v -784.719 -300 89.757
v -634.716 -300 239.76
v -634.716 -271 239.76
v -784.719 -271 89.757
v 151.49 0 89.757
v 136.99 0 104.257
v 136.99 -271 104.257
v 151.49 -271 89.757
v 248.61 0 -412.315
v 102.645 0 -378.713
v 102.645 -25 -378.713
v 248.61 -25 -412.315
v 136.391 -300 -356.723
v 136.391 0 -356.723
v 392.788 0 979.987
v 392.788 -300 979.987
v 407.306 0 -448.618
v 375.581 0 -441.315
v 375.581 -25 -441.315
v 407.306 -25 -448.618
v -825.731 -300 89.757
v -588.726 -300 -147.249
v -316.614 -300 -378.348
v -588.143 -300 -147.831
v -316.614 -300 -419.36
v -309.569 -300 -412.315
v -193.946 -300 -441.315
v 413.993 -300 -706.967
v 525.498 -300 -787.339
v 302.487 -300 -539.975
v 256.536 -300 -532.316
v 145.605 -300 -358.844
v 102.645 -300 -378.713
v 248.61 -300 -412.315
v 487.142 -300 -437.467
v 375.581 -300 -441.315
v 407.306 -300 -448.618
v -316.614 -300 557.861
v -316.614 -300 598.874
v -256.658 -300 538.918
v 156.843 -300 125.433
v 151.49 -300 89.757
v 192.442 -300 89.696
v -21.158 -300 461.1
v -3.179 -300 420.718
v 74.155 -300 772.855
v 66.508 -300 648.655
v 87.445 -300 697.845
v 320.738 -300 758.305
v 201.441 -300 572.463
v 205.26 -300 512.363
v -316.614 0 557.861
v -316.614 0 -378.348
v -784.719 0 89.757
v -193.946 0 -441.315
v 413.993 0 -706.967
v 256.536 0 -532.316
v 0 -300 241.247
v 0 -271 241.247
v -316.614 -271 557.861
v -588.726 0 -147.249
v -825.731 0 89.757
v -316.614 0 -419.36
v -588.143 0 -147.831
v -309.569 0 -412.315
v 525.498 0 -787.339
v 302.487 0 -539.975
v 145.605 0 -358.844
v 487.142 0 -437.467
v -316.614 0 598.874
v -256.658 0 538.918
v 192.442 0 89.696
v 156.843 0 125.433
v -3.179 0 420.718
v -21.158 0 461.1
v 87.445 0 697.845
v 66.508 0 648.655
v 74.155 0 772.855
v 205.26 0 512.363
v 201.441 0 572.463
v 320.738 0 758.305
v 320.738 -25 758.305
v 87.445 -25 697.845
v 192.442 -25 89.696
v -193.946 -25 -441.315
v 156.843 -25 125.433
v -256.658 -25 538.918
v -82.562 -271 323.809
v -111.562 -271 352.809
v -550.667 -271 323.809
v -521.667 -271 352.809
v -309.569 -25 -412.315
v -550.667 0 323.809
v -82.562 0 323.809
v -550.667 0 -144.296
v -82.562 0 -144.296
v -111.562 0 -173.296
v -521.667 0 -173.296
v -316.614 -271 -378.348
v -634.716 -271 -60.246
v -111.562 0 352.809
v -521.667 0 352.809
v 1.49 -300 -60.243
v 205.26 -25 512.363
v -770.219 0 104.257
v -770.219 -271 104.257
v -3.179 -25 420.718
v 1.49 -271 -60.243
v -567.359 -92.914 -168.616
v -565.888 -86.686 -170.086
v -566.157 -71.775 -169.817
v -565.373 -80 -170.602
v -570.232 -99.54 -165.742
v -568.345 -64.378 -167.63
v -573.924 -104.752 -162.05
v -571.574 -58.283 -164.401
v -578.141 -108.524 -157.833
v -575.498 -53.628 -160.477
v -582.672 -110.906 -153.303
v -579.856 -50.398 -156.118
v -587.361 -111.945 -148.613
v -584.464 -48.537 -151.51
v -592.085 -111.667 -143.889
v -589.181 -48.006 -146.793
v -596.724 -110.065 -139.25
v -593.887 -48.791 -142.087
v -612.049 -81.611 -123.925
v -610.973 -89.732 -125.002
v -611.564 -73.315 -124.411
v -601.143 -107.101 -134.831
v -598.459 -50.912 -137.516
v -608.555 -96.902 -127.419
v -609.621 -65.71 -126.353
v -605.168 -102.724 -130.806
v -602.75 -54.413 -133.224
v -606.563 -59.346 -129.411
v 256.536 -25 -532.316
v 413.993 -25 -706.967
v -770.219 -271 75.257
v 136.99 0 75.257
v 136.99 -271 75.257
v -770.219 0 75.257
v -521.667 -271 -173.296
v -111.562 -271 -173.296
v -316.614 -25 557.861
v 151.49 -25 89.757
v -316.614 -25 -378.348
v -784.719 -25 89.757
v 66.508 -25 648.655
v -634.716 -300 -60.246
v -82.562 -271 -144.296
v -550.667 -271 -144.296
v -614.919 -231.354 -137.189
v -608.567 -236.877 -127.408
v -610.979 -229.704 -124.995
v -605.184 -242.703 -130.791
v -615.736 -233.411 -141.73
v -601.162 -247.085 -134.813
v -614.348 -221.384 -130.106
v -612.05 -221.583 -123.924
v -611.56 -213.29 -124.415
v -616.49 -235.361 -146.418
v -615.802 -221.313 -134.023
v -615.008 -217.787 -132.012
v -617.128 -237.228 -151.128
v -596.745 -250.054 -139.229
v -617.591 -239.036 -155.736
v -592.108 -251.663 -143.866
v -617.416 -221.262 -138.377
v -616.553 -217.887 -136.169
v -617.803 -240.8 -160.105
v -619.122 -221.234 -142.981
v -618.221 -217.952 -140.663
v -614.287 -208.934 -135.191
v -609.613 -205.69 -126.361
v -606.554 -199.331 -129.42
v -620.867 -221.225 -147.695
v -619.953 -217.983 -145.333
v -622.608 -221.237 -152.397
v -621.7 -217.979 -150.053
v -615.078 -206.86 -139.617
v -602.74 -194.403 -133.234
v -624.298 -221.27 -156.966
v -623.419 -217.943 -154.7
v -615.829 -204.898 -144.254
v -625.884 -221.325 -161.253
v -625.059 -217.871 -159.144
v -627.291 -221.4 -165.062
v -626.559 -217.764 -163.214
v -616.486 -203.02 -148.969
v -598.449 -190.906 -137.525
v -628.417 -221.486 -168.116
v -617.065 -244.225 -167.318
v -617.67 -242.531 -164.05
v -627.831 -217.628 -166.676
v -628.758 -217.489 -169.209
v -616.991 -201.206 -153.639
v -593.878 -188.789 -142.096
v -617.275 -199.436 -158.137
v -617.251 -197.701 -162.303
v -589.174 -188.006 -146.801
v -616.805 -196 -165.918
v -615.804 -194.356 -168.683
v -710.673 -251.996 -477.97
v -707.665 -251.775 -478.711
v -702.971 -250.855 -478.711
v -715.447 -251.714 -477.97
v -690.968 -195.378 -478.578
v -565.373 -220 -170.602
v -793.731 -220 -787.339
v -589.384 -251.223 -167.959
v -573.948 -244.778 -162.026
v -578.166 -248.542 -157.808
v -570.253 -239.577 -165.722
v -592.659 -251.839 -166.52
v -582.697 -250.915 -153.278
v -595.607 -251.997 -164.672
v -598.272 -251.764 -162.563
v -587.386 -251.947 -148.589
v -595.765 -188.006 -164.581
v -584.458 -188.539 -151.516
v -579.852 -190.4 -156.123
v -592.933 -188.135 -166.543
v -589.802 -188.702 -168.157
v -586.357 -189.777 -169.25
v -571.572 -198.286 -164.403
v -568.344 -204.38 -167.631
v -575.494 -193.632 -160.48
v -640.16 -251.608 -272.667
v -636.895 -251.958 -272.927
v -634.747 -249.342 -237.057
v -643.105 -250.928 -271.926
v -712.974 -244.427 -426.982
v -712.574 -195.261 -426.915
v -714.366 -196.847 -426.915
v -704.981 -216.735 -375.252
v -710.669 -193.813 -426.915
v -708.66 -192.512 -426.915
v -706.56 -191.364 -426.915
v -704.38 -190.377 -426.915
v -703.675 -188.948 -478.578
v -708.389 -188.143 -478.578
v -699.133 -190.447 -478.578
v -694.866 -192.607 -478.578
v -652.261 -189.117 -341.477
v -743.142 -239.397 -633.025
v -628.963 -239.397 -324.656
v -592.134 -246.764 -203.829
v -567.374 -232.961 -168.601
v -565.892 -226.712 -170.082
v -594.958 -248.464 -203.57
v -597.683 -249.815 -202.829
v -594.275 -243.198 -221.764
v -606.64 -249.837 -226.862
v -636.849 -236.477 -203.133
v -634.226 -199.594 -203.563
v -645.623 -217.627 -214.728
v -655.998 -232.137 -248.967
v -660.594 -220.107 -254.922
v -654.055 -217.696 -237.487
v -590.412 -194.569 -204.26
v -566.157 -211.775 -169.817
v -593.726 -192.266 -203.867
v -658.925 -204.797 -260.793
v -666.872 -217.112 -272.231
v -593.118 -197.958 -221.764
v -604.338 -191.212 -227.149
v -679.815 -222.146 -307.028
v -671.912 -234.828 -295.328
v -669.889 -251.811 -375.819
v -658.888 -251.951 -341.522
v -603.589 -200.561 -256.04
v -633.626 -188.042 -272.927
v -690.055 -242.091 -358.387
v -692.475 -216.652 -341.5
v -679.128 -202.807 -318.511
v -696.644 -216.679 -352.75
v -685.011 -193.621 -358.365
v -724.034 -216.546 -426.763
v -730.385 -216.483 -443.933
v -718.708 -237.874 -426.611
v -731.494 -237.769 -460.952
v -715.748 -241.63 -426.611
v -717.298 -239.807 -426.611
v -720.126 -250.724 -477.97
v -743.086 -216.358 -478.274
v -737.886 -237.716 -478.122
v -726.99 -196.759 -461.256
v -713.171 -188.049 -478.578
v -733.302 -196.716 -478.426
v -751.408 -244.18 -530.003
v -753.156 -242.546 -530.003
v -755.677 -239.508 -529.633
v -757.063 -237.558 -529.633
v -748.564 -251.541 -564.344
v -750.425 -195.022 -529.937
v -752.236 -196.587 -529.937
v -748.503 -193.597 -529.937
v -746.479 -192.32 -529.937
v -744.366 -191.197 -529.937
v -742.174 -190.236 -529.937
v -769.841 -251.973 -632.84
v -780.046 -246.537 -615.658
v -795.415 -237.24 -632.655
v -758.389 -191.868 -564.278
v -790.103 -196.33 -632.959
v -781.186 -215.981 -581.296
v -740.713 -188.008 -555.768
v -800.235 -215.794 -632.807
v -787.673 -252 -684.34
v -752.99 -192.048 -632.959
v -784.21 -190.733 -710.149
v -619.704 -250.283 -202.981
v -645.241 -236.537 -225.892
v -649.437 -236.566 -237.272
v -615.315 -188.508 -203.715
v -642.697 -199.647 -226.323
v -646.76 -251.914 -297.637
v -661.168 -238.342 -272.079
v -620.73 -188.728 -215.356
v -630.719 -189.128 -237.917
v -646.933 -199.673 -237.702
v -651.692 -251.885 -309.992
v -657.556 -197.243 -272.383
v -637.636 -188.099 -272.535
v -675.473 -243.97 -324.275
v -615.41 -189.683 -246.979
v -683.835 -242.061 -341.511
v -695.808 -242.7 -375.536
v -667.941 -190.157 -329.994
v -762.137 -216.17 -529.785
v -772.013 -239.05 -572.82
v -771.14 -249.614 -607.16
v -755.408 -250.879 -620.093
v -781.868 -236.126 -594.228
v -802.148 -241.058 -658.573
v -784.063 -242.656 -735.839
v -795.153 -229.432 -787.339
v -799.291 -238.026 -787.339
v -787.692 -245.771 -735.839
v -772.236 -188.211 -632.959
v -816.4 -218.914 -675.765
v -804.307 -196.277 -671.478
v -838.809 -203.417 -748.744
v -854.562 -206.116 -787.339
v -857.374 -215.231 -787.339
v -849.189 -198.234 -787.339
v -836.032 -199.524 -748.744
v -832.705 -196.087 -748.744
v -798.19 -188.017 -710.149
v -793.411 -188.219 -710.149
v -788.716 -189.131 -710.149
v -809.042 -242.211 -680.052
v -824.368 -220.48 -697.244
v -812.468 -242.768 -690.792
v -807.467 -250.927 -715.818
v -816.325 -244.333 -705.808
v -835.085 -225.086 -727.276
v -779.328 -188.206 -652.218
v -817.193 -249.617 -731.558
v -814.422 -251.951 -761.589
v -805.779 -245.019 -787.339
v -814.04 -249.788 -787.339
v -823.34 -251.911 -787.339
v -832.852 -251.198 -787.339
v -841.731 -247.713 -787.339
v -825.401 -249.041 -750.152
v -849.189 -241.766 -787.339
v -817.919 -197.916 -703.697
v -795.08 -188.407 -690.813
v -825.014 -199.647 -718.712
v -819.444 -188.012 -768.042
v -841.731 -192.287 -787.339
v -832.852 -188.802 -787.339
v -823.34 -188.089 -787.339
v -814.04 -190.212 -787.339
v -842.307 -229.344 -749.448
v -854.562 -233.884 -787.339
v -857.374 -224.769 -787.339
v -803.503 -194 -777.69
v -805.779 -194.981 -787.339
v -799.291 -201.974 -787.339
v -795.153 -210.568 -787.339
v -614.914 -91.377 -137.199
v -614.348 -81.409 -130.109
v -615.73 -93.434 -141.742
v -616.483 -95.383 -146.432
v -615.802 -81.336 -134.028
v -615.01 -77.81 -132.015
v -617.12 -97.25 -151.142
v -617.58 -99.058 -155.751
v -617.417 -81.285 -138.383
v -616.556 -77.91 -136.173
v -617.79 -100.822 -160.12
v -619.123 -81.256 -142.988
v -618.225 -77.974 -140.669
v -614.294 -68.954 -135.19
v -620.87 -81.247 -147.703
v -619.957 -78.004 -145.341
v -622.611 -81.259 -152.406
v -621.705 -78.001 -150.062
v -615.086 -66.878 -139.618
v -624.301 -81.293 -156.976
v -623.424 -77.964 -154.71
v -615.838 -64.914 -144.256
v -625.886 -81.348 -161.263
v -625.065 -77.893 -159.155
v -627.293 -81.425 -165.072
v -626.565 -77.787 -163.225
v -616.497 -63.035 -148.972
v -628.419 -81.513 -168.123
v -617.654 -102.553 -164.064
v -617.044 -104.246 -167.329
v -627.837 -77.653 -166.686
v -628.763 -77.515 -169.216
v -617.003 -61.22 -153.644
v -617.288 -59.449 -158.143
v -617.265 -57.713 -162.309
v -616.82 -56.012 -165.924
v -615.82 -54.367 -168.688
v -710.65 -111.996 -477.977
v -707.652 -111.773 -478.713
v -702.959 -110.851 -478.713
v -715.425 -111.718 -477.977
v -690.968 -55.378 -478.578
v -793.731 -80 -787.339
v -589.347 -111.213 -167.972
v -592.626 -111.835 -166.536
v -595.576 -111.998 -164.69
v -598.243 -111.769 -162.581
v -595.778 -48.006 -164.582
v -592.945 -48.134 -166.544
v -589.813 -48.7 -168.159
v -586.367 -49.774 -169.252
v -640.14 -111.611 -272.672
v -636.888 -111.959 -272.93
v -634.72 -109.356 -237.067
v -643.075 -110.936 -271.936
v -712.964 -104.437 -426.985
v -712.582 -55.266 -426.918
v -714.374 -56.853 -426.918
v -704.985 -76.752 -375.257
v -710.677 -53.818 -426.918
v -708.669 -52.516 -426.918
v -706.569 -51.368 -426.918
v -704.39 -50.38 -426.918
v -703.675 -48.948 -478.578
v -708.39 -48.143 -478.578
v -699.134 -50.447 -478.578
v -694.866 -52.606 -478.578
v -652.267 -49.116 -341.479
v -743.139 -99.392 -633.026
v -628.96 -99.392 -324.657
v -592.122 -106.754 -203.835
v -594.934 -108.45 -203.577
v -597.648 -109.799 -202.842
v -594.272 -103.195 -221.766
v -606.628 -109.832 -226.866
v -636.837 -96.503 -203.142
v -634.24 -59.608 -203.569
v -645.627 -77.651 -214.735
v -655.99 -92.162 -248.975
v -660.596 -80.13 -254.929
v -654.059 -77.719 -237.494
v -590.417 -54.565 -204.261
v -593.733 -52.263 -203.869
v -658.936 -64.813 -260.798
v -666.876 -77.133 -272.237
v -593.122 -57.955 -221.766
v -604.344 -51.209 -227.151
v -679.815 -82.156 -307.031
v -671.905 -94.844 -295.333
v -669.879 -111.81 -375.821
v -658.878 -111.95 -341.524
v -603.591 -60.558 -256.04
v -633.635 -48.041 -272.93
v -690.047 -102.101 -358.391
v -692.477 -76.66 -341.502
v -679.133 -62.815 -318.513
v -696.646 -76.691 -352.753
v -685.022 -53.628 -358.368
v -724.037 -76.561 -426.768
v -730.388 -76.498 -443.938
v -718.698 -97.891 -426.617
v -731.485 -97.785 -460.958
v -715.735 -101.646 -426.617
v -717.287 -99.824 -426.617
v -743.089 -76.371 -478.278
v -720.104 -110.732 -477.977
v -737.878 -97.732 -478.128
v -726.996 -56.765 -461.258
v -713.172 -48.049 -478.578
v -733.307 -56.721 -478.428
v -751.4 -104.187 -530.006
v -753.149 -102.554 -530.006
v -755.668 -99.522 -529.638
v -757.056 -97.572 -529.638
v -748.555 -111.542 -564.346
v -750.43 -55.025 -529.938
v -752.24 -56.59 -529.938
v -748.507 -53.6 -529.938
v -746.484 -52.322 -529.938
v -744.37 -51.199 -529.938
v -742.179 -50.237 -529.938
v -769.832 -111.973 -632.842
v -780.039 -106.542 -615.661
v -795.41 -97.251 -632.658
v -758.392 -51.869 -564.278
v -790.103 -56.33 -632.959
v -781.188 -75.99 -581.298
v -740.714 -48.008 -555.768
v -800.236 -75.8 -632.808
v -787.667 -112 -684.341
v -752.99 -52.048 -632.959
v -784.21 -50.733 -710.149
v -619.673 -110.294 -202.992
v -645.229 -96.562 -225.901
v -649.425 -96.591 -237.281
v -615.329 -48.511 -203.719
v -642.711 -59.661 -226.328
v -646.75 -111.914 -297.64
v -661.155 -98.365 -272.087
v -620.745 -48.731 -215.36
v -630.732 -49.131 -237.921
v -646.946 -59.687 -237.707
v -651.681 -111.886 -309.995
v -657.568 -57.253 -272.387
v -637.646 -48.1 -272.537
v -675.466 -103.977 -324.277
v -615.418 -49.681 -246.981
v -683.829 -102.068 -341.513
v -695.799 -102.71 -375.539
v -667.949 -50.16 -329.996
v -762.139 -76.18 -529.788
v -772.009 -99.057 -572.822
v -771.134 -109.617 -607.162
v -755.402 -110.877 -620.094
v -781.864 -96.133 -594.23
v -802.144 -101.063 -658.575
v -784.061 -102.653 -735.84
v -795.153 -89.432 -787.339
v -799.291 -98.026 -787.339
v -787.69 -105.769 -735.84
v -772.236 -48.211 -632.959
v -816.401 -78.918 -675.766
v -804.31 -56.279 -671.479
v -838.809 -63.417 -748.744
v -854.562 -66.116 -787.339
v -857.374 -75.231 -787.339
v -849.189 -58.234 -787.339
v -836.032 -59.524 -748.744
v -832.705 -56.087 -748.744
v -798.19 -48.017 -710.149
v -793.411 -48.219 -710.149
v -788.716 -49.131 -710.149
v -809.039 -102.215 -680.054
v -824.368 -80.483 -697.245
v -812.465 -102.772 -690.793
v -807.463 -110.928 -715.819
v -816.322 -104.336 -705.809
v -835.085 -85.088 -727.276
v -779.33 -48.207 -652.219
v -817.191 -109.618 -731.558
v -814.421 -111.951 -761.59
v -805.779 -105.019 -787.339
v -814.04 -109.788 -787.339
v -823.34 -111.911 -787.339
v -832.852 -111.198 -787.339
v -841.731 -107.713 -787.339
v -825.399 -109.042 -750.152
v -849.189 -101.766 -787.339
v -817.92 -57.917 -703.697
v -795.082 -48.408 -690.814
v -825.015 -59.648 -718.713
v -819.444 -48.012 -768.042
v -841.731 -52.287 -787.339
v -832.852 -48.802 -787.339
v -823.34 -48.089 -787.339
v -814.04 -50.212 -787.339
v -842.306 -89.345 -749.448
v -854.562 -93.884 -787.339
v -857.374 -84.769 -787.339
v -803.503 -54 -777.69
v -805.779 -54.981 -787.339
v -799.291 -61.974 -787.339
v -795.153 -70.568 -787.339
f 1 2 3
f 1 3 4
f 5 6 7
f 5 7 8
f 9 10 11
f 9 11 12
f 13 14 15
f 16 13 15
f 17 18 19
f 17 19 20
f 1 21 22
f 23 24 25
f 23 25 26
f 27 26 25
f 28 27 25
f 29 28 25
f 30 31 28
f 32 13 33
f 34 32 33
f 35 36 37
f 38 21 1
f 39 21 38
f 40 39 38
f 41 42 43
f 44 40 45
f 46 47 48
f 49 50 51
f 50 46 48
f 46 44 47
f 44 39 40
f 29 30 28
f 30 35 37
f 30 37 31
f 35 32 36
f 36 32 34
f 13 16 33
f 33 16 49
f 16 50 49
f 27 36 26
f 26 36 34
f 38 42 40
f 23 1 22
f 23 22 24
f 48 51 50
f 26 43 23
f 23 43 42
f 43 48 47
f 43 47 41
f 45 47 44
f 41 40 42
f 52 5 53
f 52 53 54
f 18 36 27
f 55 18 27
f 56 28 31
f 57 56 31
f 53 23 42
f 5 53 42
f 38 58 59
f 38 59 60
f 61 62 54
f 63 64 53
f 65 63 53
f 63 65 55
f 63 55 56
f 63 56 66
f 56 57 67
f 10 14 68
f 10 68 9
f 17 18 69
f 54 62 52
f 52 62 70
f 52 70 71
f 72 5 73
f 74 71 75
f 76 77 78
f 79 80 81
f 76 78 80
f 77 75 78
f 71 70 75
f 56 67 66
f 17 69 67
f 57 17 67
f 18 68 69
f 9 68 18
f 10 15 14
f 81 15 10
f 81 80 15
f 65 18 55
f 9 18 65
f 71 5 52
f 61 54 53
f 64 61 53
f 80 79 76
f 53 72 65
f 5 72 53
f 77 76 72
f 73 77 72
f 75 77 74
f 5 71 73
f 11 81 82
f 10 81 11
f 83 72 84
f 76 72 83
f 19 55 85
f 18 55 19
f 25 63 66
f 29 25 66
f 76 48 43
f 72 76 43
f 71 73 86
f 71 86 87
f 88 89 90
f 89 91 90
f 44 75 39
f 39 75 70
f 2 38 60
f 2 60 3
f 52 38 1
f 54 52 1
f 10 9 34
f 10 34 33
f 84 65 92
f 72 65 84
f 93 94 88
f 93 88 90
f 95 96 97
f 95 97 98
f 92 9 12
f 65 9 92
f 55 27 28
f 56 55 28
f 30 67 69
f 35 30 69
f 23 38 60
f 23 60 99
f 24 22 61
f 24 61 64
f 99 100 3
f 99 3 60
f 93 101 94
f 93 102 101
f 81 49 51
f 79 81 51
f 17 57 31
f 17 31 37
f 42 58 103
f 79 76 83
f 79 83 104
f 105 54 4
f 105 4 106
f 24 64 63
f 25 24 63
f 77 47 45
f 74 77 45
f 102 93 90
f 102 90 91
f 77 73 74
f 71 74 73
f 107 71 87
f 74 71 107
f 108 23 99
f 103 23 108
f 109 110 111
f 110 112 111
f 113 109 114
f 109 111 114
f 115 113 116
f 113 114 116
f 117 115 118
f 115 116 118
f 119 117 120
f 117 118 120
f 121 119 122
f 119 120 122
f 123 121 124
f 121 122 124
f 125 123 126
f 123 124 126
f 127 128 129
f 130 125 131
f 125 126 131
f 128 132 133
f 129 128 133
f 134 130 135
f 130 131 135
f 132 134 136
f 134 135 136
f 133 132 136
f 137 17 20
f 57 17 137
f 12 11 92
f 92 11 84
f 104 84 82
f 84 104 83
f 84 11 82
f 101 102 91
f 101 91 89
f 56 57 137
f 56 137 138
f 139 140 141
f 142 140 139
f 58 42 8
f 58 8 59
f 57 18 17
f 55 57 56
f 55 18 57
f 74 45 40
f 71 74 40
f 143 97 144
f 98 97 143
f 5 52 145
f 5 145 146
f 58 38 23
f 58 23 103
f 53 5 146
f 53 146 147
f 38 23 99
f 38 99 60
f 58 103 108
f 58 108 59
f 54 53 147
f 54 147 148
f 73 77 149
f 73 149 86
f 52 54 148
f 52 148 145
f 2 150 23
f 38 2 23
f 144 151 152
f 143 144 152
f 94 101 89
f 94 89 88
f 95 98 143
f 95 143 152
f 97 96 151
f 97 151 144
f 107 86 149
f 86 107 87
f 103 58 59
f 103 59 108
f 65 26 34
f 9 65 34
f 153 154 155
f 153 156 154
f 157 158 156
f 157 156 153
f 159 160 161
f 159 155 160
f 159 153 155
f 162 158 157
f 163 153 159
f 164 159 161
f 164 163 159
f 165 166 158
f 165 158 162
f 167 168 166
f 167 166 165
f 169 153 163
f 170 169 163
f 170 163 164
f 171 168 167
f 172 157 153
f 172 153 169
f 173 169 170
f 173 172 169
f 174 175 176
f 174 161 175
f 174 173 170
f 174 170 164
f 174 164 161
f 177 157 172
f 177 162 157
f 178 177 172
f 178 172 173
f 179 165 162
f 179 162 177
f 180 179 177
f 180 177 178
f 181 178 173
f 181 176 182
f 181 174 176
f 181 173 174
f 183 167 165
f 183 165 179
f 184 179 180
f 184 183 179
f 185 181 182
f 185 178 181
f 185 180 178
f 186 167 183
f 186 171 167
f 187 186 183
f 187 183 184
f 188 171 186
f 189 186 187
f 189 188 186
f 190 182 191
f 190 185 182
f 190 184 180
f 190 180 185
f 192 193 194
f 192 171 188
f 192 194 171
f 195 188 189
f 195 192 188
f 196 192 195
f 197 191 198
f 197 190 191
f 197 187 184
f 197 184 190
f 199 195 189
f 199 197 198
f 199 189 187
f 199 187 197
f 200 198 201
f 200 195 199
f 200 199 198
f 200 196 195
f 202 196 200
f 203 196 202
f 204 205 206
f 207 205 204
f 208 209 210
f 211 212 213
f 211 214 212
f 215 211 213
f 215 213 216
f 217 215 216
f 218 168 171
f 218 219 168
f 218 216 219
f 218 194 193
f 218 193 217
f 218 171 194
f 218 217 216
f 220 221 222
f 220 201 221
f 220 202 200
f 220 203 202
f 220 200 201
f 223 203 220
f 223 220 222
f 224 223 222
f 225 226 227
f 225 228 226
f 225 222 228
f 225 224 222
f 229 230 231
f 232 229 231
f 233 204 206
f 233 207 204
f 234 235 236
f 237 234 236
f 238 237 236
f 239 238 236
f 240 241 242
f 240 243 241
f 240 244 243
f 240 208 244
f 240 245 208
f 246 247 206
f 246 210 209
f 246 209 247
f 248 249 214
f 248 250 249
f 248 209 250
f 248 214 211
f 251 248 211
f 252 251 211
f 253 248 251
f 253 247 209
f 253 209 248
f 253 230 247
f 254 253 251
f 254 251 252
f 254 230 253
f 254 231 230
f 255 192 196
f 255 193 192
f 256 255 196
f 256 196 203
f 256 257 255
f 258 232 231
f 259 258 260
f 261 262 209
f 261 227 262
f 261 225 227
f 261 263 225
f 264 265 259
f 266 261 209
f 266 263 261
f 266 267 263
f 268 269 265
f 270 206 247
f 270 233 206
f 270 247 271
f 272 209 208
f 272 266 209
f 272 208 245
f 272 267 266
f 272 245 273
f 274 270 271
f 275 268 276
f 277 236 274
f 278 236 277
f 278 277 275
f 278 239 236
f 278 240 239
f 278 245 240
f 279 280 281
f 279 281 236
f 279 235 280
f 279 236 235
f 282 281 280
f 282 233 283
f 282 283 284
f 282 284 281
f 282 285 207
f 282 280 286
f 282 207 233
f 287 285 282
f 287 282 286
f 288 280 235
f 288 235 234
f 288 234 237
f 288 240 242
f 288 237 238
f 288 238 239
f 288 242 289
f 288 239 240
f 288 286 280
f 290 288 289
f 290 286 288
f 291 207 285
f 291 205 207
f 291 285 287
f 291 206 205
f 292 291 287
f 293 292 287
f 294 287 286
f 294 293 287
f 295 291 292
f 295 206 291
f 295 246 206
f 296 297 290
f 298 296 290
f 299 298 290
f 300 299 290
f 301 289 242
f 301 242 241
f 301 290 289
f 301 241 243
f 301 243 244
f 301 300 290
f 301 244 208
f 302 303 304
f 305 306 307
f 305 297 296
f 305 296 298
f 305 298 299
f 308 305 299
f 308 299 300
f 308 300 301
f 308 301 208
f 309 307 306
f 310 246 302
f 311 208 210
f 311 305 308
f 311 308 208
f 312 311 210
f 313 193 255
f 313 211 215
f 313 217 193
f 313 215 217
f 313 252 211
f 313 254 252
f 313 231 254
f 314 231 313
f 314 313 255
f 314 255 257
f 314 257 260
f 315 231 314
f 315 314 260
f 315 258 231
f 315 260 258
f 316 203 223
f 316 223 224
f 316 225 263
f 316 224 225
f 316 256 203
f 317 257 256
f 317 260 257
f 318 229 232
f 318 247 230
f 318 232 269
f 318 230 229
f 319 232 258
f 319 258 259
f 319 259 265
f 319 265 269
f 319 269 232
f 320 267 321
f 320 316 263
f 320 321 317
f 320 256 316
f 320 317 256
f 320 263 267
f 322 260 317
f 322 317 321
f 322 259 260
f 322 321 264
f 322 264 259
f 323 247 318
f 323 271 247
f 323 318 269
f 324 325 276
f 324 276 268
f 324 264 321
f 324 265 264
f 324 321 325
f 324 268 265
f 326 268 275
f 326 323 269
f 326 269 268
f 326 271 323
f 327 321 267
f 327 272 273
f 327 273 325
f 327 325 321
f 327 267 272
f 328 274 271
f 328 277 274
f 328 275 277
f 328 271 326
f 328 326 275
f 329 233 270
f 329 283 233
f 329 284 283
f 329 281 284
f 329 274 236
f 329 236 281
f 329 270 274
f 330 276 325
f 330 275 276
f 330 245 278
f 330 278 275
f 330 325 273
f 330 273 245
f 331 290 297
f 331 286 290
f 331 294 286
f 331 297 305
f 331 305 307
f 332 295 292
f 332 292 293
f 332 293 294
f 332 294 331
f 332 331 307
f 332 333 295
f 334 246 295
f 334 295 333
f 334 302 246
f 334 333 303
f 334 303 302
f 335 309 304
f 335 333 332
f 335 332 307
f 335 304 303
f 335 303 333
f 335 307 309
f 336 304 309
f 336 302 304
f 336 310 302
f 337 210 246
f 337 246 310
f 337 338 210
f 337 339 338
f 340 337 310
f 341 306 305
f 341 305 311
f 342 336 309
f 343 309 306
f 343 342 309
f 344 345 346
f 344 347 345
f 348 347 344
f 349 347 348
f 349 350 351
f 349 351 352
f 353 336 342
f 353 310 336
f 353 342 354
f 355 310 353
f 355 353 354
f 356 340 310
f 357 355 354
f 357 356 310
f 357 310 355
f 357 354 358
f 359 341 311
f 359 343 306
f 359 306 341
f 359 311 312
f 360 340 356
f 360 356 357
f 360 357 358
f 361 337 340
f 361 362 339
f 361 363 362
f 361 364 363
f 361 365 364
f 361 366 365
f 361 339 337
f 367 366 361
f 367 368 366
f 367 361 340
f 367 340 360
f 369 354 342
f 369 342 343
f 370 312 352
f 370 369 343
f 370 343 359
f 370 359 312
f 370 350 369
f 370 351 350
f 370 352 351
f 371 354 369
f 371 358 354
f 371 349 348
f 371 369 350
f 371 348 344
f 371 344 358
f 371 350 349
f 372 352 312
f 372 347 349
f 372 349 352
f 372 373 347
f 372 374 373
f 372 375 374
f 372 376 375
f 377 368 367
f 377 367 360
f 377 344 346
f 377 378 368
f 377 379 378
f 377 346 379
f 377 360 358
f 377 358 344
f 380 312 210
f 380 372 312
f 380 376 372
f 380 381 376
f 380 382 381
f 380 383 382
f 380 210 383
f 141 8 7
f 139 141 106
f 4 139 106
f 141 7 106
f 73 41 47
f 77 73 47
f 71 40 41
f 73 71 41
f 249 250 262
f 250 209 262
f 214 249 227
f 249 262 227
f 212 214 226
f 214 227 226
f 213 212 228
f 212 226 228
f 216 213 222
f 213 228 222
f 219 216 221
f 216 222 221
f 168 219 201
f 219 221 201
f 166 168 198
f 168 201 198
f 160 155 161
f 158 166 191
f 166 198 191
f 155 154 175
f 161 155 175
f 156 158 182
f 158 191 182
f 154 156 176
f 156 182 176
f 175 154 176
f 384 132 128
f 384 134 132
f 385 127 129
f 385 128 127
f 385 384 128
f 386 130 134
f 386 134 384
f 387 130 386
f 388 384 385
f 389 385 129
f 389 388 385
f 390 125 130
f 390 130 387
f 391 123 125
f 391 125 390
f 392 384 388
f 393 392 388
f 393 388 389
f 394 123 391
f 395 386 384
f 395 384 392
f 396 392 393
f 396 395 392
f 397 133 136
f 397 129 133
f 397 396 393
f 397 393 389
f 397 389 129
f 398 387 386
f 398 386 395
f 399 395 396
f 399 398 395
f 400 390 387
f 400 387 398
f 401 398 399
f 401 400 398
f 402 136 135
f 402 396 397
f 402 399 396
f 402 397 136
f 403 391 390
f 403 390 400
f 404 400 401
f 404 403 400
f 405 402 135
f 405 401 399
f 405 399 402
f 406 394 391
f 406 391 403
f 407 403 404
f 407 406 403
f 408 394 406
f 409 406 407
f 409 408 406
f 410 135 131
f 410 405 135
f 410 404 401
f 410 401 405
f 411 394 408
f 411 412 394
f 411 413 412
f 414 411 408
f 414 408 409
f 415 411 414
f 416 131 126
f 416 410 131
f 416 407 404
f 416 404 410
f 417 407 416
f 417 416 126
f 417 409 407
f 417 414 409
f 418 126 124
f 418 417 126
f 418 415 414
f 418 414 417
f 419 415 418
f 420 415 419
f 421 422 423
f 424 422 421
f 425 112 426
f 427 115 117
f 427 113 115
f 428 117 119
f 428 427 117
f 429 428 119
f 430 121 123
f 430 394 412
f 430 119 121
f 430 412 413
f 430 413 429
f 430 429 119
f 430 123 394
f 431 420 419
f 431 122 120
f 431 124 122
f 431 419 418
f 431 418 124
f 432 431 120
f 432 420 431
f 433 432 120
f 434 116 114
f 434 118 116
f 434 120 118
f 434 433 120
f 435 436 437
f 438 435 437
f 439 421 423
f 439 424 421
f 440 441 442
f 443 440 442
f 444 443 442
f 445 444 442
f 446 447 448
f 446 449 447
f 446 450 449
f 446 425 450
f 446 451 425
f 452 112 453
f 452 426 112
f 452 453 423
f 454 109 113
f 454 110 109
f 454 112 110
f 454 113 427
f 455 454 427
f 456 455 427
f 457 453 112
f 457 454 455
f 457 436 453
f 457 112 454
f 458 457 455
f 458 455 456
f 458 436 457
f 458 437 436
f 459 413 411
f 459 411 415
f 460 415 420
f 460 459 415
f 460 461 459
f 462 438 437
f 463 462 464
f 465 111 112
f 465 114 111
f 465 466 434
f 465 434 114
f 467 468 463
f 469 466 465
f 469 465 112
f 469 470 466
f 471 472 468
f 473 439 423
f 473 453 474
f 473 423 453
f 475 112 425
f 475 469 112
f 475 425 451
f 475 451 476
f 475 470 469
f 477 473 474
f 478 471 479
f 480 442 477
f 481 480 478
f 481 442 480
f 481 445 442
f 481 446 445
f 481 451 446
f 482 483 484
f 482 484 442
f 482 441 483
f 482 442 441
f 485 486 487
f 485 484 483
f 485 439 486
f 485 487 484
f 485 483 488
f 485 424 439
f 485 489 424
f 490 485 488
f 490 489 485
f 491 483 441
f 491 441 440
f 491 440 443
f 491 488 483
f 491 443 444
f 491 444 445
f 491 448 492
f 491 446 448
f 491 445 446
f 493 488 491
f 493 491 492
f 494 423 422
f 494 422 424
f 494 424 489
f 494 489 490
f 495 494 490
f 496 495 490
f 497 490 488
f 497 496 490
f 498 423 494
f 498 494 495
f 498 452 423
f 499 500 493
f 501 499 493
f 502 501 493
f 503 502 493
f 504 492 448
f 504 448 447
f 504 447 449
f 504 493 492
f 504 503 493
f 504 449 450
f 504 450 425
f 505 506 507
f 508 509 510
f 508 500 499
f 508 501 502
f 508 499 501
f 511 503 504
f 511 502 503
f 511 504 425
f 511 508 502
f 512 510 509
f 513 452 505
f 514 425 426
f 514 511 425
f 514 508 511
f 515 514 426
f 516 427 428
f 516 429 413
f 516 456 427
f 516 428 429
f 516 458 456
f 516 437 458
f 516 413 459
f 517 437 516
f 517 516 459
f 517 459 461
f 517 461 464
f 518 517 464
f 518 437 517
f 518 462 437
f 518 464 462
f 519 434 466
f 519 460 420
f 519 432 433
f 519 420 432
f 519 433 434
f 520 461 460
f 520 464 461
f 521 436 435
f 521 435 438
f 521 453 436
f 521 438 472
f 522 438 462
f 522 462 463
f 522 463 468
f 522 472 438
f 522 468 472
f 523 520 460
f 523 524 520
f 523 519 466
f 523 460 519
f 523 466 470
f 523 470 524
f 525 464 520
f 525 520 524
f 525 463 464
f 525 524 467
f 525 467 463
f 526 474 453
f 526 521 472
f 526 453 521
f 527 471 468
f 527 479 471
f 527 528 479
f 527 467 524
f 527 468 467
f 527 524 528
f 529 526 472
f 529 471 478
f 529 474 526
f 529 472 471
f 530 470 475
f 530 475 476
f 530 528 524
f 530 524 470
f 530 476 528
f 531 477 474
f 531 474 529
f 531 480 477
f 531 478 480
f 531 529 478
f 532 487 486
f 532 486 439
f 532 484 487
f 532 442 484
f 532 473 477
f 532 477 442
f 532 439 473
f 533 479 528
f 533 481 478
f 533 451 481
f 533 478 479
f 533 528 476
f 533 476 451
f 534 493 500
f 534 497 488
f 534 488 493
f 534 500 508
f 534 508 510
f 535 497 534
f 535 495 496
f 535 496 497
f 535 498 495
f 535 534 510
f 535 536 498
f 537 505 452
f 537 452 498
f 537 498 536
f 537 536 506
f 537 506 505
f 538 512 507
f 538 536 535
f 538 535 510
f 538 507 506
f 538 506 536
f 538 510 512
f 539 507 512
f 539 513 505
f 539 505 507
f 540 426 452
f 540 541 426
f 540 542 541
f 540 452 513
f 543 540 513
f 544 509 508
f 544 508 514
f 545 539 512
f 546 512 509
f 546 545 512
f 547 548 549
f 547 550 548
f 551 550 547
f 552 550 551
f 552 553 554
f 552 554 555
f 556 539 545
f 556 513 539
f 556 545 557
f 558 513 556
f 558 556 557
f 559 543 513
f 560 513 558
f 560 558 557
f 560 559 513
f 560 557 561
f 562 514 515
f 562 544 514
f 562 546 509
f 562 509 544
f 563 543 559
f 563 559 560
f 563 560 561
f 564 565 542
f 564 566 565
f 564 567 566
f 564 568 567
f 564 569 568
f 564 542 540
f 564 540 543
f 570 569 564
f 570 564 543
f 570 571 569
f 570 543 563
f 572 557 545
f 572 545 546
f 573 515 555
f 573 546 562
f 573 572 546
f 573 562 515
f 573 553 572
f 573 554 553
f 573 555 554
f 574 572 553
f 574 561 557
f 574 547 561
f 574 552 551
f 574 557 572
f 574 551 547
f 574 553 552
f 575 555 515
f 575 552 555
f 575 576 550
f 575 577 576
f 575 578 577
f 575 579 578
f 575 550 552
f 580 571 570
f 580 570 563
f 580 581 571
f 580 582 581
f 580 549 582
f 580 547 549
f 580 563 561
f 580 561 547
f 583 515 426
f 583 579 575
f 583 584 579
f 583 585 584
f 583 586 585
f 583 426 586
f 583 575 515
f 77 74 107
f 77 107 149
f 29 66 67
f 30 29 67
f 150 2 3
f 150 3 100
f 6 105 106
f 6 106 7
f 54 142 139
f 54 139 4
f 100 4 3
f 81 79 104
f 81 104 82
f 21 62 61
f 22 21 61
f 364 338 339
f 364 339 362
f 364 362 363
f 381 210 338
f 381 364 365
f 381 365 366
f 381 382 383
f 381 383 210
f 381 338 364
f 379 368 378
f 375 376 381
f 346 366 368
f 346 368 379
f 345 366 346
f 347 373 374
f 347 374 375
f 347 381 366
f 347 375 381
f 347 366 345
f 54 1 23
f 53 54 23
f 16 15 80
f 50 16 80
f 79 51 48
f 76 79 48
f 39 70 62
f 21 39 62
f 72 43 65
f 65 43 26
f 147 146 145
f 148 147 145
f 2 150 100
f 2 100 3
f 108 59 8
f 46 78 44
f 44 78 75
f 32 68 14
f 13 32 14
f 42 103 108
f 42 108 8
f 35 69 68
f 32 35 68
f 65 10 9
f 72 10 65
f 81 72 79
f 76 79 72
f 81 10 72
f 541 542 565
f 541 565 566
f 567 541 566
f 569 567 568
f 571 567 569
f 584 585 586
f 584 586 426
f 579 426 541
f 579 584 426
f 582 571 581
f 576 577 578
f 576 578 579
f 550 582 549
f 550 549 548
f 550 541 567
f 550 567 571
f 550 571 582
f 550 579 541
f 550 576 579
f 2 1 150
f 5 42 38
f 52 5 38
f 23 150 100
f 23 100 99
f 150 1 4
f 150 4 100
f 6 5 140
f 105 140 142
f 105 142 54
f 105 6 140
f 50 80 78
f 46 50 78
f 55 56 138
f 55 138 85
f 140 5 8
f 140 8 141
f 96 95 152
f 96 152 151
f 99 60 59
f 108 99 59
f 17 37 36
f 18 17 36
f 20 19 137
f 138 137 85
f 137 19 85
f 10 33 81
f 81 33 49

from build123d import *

# Parameters (mm, degrees)
F1_DEPTH  = 300
F3_DEPTH  = 300.001
F5_DEPTH  = 29
F6_W      = 114.4185625017
F6_H      = 85.1782578975
F7_DEPTH  = 787.3392
F8_R      = 32
F11_DEPTH = 29
F13_DEPTH = 1133
F16_DEPTH = 25
F18_DEPTH = 271


# Not quite as in the source:
# - ends of sketch curves that miss each other by under 0.0002 mm in the source are joined


with BuildPart() as f1:
    # F0 (on Front) → F1 (new body)
    with BuildSketch(Plane.XZ):
        Polygon((-21.1578859129, 461.1000678804), (-316.6142244869, 598.8736212078), (-256.6584088585, 538.9178055795), (-3.1787667582, 420.7183072818), (66.3378061044, 648.0967762461), (156.9029738247, 125.3564228963), (192.5026579675, 89.7567387535), (102.4632774249, -379.6587024434), (248.7953454256, -413.3447998695), (-310.5988806554, -413.3447998695), (-316.6142244868, -419.3601437008), (525.4976853374, -787.3391258891), (302.487393405, -539.9754328116), (487.1423766473, -437.4670079686), (145.604754854, -358.8439845974), (136.3912729242, -356.7230123856), (392.7879601275, 979.987250609), (201.4411428648, 572.4630155265), (74.1552898267, 772.8554183243), align=None)
        Polygon((379.9683977473, -442.5537108722), (407.0146211055, -448.7798356546), (256.5361856193, -532.3156662273), (413.9925393712, -706.9667319925), (-191.1109175542, -442.5537108722), align=None, mode=Mode.SUBTRACT)
        Polygon((320.7380442272, 758.304990145), (192.5026579675, 89.7567387535), (87.0405885007, 698.4817279892), (205.2598565448, 512.363297583), align=None, mode=Mode.SUBTRACT)
        Polygon((-316.6142244869, 598.8736212078), (-825.7311069412, 89.7567387535), (-588.7256799965, -147.2486881911), (-588.1432284625, -147.8311397252), (-316.6142244868, -419.3601437008), (-310.5988806554, -413.3447998695), (-301.6208118268, -404.3667310409), (192.5026579675, 89.7567387535), (156.9029738247, 125.3564228963), (-256.6584088585, 538.9178055795), align=None)
        Polygon((-316.6142244867, -378.347950392), (-577.6435249243, -117.3186499544), (-784.7189136323, 89.7567387535), (-316.6142244868, 557.861427899), (151.4904646587, 89.7567387535), align=None, mode=Mode.SUBTRACT)
        Polygon((-784.7189136323, 89.7567387535), (-577.6435249243, -117.3186499544), (-316.6142244867, -378.347950392), (151.4904646587, 89.7567387535), (-316.6142244868, 557.861427899), align=None)
        Polygon((87.0405885007, 698.4817279892), (192.5026579675, 89.7567387535), (320.7380442272, 758.304990145), (205.2598565448, 512.363297583), align=None)
        Polygon((256.5361856193, -532.3156662273), (407.0146211055, -448.7798356546), (379.9683977473, -442.5537108722), (-191.1109175542, -442.5537108722), (413.9925393712, -706.9667319925), align=None)
        Polygon((102.4632774249, -379.6587024434), (192.5026579675, 89.7567387535), (-301.6208118268, -404.3667310409), (-310.5988806554, -413.3447998695), (248.7953454256, -413.3447998695), align=None)
        Polygon((-3.1787667582, 420.7183072818), (-256.6584088585, 538.9178055795), (156.9029738247, 125.3564228963), (66.3378074545, 648.0967806623), align=None)
    extrude(amount=F1_DEPTH)

    # F2 (on face) → F3 (cut, through all)
    with BuildSketch(Plane.XZ.offset(300)):
        Polygon((-316.6142244869, 557.861427899), (-784.7189136323, 89.7567387535), (-316.6142244868, -378.347950392), (151.4904646587, 89.7567387536), align=None)
        Polygon((66.5084501228, 648.6549276806), (-3.1787679861, 420.7183078543), (-256.6584088585, 538.9178055795), (156.843021512, 125.4326254129), align=None)
        Polygon((205.2598565448, 512.363297583), (87.4447238518, 697.845477753), (192.441997649, 89.6960784351), (-309.5687277895, -412.3146470034), (248.6102088079, -412.3146470034), (102.6446876949, -378.7129298117), (320.7380442272, 758.304990145), align=None)
        Polygon((375.5810214862, -441.3146470034), (-193.9464883107, -441.3146470034), (413.9925393712, -706.9667319925), (256.5361856193, -532.3156662273), (407.306312324, -448.6179076805), align=None)
    extrude(amount=-F3_DEPTH, mode=Mode.SUBTRACT)


with BuildPart() as f5:
    # F4 (on face) → F5 (new body)
    with BuildSketch(Plane.XZ.offset(300)):
        Polygon((-316.6142244869, -378.347950392), (-316.6142244869, 557.861427899), (-634.7160485409, 239.7596038449), (-634.7160485409, -60.2461263379), align=None)
    extrude(amount=-F5_DEPTH)


with BuildPart() as f5b:
    # F4 (on face) → F5, piece 2 (new body)
    with BuildSketch(Plane.XZ.offset(300)):
        Polygon((151.4904646587, 89.7567387536), (0, 241.2472034122), (1.4904232565, -60.2433026486), align=None)
    extrude(amount=-F5_DEPTH)


with BuildPart() as f7:
    # F6 (on Top) → F7 (new body)
    with BuildSketch(Plane.XY):
        with Locations((468.2884040865, 458.3749382247)):
            Rectangle(F6_W, F6_H)
    extrude(amount=-F7_DEPTH)


with BuildPart() as f9:
    # F9: sweep along a path in F0
    with BuildLine(Plane.XZ) as f9_path:
        Line((-566.2141442299, -86.4508450031), (-825.7311069412, -787.3391258892))
    # F8 (on face) → F9 (sweep)
    with BuildSketch(Plane(origin=(0, 0, -787.3392), x_dir=(1, 0, 0), z_dir=(0, 0, -1))):
        with Locations((-825.7311069411, 220)):
            Circle(F8_R)
        with Locations((-825.7311069411, 80)):
            Circle(F8_R)
    sweep(path=f9_path.line)


with BuildPart() as f11:
    # F4 (on face) → F11 (new body)
    with BuildSketch(Plane.XZ.offset(300)):
        Polygon((-634.7160485409, -60.2461263379), (-634.7160485409, 239.7596038449), (-784.7189136323, 89.7567387535), align=None)
    extrude(amount=-F11_DEPTH)


with BuildPart() as f11b:
    # F4 (on face) → F11, piece 2 (new body)
    with BuildSketch(Plane.XZ.offset(300)):
        Polygon((0, 241.2472034122), (-316.6142244869, 557.861427899), (-316.6142244869, -378.347950392), (1.4904232565, -60.2433026486), align=None)
    extrude(amount=-F11_DEPTH)


with BuildPart() as f13:
    # F12 (on face) → F13 (new body)
    with BuildSketch(Plane(origin=(0, 0, 0), x_dir=(-1, 0, 0), z_dir=(0, 1, 0))):
        Polygon((444.9293017387, 0), (514.3381191953, -221.6362489923), (704.6059726342, -31.3683955535), align=None)
    extrude(amount=-F13_DEPTH)


with BuildPart() as f9_1:
    add(f9.part)

    # F14: cut F13
    add(f13.part, mode=Mode.SUBTRACT)


with BuildPart() as f16:
    # F15 (on face) → F16 (new body)
    with BuildSketch(Plane(origin=(0, 0, 0), x_dir=(-1, 0, 0), z_dir=(0, 1, 0))):
        Polygon((784.7189136323, 89.7567387535), (316.6142244869, 557.861427899), (-151.4904646587, 89.7567387536), (316.6142244868, -378.347950392), align=None)
    extrude(amount=-F16_DEPTH)


with BuildPart() as f16b:
    # F15 (on face) → F16, piece 2 (new body)
    with BuildSketch(Plane(origin=(0, 0, 0), x_dir=(-1, 0, 0), z_dir=(0, 1, 0))):
        Polygon((-248.6102088079, -412.3146470034), (309.5687277895, -412.3146470034), (-192.441997649, 89.6960784351), (-87.4447238518, 697.845477753), (-205.2598565448, 512.363297583), (-320.7380442272, 758.304990145), (-102.6446876949, -378.7129298117), align=None)
    extrude(amount=-F16_DEPTH)


with BuildPart() as f16c:
    # F15 (on face) → F16, piece 3 (new body)
    with BuildSketch(Plane(origin=(0, 0, 0), x_dir=(-1, 0, 0), z_dir=(0, 1, 0))):
        Polygon((-375.5810214862, -441.3146470034), (-407.306312324, -448.6179076805), (-256.5361856193, -532.3156662273), (-413.9925393712, -706.9667319925), (193.9464883107, -441.3146470034), align=None)
    extrude(amount=-F16_DEPTH)


with BuildPart() as f16d:
    # F15 (on face) → F16, piece 4 (new body)
    with BuildSketch(Plane(origin=(0, 0, 0), x_dir=(-1, 0, 0), z_dir=(0, 1, 0))):
        Polygon((3.1787679861, 420.7183078543), (-66.5084501228, 648.6549276806), (-156.843021512, 125.4326254129), (256.6584088585, 538.9178055795), align=None)
    extrude(amount=-F16_DEPTH)


with BuildPart() as f18:
    # F17 (on face) → F18 (new body)
    with BuildSketch(Plane(origin=(0, 0, 0), x_dir=(-1, 0, 0), z_dir=(0, 1, 0))):
        Polygon((111.5618799141, 352.8090833263), (82.5618799141, 323.8090833263), (550.6665690596, 323.8090833263), (521.6665690596, 352.8090833263), align=None)
    extrude(amount=-F18_DEPTH)


with BuildPart() as f18b:
    # F17 (on face) → F18, piece 2 (new body)
    with BuildSketch(Plane(origin=(0, 0, 0), x_dir=(-1, 0, 0), z_dir=(0, 1, 0))):
        Polygon((-136.9904646587, 104.2567387535), (-151.4904646587, 89.7567387536), (-136.9904646586, 75.2567387535), (770.2189136323, 75.2567387535), (784.7189136323, 89.7567387535), (770.2189136323, 104.2567387535), align=None)
    extrude(amount=-F18_DEPTH)


with BuildPart() as f18c:
    # F17 (on face) → F18, piece 3 (new body)
    with BuildSketch(Plane(origin=(0, 0, 0), x_dir=(-1, 0, 0), z_dir=(0, 1, 0))):
        Polygon((550.6665690596, -144.2956058192), (82.5618799141, -144.2956058192), (111.5618799141, -173.2956058192), (521.6665690596, -173.2956058192), align=None)
    extrude(amount=-F18_DEPTH)


solid = Compound([f1.part, f5.part, f5b.part, f11.part, f11b.part, f9_1.part, f16.part, f16b.part, f16c.part, f16d.part, f18.part, f18b.part, f18c.part])
